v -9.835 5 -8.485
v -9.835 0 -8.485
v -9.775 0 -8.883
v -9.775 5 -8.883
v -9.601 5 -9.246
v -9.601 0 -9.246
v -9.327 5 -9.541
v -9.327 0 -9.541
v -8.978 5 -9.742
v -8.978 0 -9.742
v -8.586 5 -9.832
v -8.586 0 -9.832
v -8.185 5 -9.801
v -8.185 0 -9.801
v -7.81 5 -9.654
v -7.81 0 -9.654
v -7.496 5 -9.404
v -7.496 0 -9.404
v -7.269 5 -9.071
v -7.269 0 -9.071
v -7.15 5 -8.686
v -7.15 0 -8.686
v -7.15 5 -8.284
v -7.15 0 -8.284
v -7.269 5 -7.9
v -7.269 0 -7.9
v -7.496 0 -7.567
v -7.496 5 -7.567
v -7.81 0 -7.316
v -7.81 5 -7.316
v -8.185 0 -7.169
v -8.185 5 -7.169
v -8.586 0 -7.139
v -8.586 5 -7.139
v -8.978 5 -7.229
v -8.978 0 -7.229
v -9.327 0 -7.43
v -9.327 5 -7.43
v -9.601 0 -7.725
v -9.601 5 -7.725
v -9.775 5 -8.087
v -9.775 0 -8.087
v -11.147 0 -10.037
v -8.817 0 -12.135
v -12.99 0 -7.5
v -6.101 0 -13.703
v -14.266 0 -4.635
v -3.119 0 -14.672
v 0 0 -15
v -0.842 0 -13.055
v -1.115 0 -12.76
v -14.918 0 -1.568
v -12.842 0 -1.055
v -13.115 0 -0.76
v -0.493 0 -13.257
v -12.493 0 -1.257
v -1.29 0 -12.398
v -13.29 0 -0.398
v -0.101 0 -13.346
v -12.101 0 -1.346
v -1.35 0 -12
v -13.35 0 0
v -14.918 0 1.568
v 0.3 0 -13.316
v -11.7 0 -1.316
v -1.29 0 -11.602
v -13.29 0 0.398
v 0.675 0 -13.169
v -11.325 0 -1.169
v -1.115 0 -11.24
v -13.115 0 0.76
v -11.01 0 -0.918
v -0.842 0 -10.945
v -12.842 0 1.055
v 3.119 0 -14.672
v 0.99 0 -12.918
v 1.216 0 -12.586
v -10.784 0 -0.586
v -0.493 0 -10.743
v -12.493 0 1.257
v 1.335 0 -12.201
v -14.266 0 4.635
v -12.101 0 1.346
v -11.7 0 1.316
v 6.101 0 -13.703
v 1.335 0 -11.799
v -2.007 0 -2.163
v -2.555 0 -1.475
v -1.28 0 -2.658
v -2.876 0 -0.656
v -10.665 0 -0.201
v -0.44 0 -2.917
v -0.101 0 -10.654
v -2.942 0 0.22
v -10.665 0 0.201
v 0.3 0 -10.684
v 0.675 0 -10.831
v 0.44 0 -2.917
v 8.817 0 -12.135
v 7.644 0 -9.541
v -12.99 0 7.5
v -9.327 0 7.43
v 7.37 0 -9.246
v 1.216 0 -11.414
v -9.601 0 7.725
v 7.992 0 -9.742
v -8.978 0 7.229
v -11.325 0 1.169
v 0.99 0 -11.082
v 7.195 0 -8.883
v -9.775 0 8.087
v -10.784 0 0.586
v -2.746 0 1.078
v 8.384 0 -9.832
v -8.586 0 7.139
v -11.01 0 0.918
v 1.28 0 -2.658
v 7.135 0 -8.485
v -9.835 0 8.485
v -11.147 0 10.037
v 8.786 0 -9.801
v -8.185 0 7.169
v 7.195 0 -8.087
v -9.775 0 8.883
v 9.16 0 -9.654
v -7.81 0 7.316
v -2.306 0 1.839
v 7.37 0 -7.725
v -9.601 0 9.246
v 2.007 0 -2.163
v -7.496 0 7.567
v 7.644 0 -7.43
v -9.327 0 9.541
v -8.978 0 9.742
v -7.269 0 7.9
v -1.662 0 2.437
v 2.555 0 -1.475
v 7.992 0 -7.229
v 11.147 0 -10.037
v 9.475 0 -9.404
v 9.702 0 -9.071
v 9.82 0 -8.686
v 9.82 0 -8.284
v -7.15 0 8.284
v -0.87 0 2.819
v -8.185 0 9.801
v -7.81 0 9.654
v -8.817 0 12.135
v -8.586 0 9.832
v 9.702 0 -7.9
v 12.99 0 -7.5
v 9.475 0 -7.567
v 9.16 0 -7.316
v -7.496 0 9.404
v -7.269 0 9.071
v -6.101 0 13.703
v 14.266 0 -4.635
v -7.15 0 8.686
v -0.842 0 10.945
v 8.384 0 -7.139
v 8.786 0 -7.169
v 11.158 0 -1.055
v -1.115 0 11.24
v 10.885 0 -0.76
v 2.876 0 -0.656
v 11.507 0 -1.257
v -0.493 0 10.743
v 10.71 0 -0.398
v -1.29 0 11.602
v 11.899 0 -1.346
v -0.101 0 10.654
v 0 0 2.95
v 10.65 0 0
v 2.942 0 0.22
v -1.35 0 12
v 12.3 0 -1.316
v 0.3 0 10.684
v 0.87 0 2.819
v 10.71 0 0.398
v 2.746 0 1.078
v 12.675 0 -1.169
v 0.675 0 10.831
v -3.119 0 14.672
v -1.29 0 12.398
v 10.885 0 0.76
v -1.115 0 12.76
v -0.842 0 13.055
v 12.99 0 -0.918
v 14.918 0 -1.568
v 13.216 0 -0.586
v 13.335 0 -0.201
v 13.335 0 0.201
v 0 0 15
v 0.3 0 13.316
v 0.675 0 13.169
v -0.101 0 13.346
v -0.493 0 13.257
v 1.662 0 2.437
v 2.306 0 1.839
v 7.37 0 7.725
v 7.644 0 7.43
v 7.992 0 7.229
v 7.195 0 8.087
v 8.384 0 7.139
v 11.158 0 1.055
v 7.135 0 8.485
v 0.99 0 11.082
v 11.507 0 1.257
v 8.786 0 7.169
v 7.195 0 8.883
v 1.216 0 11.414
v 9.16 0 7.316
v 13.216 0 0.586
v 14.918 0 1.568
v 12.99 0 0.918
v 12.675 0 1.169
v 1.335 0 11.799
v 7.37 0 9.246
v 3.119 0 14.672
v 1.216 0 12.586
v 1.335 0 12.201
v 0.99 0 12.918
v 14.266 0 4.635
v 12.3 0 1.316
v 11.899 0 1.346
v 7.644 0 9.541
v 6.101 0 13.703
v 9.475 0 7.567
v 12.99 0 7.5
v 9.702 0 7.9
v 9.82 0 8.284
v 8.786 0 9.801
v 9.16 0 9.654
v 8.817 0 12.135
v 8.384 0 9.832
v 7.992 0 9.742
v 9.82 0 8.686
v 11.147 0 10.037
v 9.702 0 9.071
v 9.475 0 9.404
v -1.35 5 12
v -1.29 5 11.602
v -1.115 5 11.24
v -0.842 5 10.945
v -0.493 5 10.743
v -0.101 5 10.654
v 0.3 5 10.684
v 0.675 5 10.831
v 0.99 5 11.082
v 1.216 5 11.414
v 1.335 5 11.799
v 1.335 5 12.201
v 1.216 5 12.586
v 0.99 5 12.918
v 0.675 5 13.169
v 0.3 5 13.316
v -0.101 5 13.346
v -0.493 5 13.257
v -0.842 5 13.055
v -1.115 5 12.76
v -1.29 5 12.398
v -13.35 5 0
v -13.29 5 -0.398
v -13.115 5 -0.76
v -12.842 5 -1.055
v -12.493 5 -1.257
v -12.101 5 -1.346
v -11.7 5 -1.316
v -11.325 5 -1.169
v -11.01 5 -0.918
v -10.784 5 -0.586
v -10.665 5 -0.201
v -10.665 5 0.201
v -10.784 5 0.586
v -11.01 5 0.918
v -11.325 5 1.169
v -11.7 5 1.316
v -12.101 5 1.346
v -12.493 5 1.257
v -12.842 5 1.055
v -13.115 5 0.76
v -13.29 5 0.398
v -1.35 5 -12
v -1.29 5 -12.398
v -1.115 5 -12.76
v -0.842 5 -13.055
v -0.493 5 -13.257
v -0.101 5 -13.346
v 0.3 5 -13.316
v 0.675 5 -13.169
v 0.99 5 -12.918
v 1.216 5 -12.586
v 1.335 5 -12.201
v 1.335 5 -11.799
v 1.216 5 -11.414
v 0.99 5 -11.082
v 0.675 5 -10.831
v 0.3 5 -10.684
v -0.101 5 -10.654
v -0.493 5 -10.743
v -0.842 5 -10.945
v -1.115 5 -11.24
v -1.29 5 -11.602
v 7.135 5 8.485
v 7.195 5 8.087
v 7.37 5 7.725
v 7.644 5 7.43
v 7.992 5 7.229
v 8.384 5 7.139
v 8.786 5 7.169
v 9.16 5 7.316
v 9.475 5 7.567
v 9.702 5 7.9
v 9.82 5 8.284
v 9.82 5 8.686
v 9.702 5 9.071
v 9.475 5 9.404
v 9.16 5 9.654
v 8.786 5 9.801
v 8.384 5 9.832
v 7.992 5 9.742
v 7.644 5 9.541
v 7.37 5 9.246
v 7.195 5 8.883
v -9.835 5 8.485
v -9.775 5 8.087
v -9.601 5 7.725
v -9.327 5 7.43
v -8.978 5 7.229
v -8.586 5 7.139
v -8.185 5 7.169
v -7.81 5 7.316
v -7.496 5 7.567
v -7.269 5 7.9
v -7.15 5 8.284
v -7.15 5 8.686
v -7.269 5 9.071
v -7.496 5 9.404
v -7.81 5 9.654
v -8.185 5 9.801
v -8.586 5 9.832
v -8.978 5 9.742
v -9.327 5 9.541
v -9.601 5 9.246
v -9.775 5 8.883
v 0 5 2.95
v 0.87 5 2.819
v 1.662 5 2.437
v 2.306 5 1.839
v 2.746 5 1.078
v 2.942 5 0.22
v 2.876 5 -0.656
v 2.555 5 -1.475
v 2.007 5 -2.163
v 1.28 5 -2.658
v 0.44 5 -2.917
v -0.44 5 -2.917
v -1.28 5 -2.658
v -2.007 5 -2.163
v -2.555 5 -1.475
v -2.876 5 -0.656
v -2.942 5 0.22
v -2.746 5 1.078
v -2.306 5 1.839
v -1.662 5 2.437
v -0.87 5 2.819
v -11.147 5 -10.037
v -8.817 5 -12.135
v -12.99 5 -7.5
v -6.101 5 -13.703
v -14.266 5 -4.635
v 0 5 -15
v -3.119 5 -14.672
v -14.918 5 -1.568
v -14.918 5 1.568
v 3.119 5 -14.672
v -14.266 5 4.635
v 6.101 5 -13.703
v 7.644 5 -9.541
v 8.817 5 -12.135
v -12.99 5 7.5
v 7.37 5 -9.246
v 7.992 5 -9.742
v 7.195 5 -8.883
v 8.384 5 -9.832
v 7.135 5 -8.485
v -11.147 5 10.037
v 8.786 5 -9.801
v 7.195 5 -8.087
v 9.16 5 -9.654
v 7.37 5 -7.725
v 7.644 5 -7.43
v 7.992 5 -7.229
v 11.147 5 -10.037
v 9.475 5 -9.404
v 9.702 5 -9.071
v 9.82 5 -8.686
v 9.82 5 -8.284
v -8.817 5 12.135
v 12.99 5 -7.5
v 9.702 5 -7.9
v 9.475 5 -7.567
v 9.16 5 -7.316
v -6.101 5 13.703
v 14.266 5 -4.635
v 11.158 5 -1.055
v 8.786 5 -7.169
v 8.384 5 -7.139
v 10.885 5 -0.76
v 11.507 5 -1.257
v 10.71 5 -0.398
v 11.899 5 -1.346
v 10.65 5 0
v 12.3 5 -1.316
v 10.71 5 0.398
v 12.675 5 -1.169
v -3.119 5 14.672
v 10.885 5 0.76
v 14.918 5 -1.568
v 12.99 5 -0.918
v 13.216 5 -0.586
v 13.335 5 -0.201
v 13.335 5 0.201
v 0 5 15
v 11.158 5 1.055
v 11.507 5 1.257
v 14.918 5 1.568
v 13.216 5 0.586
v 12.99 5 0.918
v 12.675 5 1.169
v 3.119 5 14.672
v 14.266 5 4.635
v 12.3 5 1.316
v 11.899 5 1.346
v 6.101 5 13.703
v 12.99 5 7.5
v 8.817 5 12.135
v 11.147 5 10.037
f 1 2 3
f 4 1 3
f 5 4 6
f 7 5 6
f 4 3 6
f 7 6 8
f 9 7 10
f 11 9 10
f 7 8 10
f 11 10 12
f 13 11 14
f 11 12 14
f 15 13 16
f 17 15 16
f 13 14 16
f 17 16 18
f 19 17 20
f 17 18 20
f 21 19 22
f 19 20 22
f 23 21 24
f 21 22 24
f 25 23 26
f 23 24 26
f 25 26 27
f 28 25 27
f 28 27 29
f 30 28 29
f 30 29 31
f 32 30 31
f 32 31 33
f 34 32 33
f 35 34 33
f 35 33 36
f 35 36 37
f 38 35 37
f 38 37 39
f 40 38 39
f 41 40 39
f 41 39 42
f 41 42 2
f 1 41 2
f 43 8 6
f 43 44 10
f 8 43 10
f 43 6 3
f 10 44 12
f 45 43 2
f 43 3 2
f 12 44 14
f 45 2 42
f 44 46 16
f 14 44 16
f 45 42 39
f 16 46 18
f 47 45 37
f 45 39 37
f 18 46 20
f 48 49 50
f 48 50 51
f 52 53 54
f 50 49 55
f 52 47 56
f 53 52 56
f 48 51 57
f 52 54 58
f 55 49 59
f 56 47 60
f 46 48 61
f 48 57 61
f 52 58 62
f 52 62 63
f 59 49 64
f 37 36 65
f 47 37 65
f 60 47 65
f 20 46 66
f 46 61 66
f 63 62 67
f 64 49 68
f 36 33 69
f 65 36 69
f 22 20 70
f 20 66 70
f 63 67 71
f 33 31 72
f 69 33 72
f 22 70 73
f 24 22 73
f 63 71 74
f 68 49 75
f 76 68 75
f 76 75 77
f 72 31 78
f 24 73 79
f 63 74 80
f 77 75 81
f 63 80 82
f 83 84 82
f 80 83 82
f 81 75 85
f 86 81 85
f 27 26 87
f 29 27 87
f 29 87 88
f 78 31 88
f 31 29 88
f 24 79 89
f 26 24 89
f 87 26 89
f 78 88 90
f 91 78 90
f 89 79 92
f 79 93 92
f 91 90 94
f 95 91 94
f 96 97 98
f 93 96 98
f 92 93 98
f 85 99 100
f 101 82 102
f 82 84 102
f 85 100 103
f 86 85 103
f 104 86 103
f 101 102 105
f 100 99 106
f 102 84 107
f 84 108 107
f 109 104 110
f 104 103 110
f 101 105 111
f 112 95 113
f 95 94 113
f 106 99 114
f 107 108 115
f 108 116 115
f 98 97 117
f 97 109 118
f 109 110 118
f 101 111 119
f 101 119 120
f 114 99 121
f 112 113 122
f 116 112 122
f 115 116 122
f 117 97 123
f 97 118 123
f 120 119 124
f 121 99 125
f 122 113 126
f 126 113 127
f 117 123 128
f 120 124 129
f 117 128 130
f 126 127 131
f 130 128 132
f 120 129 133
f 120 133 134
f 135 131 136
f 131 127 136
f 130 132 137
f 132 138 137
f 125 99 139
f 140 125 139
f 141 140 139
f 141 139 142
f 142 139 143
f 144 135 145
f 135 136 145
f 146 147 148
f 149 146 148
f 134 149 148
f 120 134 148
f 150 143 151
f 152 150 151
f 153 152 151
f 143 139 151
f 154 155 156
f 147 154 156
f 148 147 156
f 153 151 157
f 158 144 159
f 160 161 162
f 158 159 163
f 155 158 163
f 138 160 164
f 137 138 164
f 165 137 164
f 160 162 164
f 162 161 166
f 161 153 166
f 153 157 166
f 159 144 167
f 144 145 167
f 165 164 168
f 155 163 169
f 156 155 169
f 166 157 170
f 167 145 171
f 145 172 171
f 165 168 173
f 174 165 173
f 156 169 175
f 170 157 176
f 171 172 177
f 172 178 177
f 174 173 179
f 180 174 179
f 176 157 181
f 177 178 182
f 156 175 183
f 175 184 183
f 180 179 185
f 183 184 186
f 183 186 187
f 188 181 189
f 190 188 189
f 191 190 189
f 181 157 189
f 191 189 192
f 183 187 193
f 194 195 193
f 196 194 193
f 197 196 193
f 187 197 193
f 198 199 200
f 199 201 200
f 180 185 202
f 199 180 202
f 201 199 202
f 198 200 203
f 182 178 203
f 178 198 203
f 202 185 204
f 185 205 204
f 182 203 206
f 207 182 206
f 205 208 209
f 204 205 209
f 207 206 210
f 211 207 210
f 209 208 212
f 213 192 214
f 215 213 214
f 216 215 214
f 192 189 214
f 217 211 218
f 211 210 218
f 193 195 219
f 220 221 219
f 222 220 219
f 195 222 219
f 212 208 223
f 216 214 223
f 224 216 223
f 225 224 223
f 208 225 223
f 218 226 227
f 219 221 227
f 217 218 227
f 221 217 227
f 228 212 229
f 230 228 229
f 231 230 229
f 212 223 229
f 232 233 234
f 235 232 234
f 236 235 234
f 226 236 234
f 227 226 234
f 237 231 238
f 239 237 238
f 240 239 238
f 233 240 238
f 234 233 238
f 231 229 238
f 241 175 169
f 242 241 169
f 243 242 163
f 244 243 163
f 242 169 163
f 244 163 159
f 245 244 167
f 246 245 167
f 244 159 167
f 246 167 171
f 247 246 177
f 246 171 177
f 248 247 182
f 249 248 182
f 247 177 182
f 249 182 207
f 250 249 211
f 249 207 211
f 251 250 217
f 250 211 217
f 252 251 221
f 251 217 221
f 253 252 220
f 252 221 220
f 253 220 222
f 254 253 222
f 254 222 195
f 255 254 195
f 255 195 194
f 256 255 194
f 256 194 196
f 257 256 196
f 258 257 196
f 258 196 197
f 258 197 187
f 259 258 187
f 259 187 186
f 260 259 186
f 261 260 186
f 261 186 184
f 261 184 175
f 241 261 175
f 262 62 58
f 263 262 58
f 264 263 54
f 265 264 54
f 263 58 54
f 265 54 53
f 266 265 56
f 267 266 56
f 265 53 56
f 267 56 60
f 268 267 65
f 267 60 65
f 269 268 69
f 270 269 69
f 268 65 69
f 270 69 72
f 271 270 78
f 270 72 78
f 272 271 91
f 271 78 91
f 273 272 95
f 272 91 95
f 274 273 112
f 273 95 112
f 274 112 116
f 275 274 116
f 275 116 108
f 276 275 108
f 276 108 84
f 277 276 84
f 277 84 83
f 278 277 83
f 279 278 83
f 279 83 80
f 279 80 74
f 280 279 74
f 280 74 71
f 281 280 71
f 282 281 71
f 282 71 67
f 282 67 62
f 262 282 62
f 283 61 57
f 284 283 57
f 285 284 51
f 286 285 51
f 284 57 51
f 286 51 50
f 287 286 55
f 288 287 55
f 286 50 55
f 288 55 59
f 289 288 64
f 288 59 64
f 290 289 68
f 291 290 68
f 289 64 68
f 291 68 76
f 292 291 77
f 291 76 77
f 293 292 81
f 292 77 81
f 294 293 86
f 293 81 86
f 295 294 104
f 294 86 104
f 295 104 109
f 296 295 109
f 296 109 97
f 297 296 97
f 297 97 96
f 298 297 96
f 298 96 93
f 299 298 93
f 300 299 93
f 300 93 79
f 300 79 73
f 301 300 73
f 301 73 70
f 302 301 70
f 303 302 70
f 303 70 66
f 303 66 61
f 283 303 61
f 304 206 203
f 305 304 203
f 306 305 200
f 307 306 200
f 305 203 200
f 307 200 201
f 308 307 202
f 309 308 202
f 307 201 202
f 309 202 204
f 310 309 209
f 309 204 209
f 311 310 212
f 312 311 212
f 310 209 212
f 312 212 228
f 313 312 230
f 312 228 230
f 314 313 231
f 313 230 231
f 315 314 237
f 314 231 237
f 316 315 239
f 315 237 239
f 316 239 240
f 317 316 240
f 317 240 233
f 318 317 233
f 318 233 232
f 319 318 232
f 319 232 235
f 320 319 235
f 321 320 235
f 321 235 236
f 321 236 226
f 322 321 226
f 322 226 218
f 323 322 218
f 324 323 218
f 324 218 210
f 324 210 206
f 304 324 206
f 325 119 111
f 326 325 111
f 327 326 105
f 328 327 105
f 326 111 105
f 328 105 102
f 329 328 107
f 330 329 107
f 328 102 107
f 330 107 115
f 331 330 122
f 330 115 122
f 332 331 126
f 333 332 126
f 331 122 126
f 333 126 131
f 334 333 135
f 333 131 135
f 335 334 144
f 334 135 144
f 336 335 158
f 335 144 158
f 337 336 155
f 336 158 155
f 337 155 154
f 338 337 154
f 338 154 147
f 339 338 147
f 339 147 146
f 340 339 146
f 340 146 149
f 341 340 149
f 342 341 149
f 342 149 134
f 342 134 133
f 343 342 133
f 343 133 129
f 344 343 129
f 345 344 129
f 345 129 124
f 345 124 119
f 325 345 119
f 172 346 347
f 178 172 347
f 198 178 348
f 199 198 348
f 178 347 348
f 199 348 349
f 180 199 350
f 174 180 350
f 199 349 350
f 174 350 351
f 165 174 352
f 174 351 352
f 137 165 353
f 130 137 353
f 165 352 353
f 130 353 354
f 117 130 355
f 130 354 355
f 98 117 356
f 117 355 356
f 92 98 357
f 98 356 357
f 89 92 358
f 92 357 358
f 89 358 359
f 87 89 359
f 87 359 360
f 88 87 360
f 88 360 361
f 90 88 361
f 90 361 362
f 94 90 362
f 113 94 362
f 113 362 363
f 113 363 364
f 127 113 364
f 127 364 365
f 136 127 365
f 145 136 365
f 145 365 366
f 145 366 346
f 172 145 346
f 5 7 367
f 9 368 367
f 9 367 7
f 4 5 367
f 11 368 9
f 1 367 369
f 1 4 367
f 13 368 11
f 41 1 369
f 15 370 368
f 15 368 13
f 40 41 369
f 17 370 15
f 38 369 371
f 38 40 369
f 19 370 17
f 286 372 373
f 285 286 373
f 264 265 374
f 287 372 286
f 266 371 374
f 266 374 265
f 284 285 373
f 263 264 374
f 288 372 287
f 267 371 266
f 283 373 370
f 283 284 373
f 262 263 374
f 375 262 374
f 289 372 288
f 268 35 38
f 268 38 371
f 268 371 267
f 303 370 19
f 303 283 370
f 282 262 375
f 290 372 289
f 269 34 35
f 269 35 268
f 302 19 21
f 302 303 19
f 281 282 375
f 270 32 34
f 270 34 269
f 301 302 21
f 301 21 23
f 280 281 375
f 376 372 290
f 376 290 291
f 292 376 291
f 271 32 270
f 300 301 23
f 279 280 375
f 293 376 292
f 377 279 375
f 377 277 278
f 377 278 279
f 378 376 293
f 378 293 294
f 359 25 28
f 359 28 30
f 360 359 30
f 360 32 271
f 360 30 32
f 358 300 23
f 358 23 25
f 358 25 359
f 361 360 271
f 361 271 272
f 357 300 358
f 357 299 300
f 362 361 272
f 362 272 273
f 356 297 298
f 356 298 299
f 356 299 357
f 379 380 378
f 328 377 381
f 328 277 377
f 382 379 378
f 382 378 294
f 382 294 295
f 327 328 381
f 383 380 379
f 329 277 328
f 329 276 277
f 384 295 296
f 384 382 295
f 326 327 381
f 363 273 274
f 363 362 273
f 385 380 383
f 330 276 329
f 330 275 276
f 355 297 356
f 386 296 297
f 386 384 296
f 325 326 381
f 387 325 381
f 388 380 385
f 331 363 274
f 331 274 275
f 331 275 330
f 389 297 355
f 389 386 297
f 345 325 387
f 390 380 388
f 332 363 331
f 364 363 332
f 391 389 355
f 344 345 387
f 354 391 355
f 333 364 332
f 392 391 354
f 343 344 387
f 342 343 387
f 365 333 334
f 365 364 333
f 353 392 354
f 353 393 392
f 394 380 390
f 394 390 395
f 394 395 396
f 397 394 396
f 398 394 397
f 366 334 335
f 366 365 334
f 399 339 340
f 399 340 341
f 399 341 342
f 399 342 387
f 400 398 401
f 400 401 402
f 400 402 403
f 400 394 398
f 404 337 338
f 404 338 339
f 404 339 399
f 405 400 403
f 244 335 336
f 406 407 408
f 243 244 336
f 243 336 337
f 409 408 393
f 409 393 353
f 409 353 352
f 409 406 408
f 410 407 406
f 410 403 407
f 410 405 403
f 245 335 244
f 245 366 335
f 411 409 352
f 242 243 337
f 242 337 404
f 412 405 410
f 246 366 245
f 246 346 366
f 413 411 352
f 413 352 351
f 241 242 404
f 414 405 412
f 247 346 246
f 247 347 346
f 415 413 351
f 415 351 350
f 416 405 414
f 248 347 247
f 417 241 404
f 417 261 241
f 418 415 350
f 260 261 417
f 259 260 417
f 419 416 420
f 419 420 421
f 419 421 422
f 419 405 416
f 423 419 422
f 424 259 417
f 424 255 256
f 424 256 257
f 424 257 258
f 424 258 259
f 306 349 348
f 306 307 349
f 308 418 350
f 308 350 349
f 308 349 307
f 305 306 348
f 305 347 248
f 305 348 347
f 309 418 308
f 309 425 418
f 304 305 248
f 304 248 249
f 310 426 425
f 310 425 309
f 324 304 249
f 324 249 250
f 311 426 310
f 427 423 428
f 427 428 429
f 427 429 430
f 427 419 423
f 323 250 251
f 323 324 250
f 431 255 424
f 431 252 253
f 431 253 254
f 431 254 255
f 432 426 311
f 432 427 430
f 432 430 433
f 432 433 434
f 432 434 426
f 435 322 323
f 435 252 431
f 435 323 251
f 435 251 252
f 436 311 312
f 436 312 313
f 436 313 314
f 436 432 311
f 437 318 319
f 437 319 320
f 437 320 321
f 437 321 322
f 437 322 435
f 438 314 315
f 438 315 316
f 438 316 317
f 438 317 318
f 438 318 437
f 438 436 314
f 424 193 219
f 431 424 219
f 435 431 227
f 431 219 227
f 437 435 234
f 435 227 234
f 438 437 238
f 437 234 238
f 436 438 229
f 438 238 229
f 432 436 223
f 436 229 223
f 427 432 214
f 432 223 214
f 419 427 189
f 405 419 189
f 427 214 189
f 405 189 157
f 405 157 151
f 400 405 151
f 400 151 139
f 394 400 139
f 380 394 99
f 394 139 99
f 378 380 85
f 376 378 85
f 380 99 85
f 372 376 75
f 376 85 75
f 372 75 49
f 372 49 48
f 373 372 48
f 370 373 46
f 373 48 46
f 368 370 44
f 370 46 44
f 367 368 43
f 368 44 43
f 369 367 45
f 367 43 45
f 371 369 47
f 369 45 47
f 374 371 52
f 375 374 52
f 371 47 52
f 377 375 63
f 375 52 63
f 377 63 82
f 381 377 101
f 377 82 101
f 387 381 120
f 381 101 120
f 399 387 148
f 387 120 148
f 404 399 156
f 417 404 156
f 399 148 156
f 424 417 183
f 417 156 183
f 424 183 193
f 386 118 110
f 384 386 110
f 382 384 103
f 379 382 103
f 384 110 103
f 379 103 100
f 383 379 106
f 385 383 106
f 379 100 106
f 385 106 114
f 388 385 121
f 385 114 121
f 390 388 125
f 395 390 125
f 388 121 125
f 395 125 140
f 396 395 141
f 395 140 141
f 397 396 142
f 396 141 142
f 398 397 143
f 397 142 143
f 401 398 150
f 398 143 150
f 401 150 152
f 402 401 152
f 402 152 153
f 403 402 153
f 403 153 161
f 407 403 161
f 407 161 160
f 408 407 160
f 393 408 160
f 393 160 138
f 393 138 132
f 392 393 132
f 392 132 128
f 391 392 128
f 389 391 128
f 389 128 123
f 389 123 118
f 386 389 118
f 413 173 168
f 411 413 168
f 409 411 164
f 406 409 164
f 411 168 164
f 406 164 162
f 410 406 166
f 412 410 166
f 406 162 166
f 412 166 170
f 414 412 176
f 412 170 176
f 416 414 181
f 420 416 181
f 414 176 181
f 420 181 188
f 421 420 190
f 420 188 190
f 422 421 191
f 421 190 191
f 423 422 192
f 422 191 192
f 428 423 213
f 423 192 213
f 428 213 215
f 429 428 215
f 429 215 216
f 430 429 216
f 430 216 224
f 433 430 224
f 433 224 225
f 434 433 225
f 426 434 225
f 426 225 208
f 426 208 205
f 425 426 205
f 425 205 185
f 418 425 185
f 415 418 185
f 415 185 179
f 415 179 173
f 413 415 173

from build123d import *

# Parameters (mm, degrees)
ESQUISSE1_R             = 15
BOSS_EXTRU_1_DEPTH      = 5
ESQUISSE2_R             = 2.95
ENL_V_MAT_EXTRU_1_DEPTH = 22.794494718
D_GAGEMENT_M2_51_D      = 2.7


with BuildPart() as part:
    # Esquisse1 → Boss.-Extru.1 (new body)
    with BuildSketch(Plane(origin=(0, 0, 0), x_dir=(1, 0, 0), z_dir=(0, 1, 0))):
        with Locations(Location((0, 0, 0), (0, 0, 270))):
            Circle(ESQUISSE1_R)
    extrude(amount=BOSS_EXTRU_1_DEPTH)

    # Esquisse2 → Enlèv. mat.-Extru.1 (cut, through all)
    with BuildSketch(Plane(origin=(0, 5, 0), x_dir=(1, 0, 0), z_dir=(0, 1, 0))):
        with Locations(Location((0, 0, 0), (0, 0, 270))):
            Circle(ESQUISSE2_R)
    extrude(amount=-ENL_V_MAT_EXTRU_1_DEPTH, mode=Mode.SUBTRACT)

    # Dégagement M2.51 (through all)
    with Locations(Plane(origin=(0, 5, 0), x_dir=(1, 0, 0), z_dir=(0, 1, 0))):
        with Locations((0, 0), (-12, 0), (-8.485281374, 8.485281374), (0, 12), (8.485281374, 8.485281374), (12, 0), (8.485281374, -8.485281374), (0, -12), (-8.485281374, -8.485281374)):
            Hole(D_GAGEMENT_M2_51_D / 2)


solid = part.part
